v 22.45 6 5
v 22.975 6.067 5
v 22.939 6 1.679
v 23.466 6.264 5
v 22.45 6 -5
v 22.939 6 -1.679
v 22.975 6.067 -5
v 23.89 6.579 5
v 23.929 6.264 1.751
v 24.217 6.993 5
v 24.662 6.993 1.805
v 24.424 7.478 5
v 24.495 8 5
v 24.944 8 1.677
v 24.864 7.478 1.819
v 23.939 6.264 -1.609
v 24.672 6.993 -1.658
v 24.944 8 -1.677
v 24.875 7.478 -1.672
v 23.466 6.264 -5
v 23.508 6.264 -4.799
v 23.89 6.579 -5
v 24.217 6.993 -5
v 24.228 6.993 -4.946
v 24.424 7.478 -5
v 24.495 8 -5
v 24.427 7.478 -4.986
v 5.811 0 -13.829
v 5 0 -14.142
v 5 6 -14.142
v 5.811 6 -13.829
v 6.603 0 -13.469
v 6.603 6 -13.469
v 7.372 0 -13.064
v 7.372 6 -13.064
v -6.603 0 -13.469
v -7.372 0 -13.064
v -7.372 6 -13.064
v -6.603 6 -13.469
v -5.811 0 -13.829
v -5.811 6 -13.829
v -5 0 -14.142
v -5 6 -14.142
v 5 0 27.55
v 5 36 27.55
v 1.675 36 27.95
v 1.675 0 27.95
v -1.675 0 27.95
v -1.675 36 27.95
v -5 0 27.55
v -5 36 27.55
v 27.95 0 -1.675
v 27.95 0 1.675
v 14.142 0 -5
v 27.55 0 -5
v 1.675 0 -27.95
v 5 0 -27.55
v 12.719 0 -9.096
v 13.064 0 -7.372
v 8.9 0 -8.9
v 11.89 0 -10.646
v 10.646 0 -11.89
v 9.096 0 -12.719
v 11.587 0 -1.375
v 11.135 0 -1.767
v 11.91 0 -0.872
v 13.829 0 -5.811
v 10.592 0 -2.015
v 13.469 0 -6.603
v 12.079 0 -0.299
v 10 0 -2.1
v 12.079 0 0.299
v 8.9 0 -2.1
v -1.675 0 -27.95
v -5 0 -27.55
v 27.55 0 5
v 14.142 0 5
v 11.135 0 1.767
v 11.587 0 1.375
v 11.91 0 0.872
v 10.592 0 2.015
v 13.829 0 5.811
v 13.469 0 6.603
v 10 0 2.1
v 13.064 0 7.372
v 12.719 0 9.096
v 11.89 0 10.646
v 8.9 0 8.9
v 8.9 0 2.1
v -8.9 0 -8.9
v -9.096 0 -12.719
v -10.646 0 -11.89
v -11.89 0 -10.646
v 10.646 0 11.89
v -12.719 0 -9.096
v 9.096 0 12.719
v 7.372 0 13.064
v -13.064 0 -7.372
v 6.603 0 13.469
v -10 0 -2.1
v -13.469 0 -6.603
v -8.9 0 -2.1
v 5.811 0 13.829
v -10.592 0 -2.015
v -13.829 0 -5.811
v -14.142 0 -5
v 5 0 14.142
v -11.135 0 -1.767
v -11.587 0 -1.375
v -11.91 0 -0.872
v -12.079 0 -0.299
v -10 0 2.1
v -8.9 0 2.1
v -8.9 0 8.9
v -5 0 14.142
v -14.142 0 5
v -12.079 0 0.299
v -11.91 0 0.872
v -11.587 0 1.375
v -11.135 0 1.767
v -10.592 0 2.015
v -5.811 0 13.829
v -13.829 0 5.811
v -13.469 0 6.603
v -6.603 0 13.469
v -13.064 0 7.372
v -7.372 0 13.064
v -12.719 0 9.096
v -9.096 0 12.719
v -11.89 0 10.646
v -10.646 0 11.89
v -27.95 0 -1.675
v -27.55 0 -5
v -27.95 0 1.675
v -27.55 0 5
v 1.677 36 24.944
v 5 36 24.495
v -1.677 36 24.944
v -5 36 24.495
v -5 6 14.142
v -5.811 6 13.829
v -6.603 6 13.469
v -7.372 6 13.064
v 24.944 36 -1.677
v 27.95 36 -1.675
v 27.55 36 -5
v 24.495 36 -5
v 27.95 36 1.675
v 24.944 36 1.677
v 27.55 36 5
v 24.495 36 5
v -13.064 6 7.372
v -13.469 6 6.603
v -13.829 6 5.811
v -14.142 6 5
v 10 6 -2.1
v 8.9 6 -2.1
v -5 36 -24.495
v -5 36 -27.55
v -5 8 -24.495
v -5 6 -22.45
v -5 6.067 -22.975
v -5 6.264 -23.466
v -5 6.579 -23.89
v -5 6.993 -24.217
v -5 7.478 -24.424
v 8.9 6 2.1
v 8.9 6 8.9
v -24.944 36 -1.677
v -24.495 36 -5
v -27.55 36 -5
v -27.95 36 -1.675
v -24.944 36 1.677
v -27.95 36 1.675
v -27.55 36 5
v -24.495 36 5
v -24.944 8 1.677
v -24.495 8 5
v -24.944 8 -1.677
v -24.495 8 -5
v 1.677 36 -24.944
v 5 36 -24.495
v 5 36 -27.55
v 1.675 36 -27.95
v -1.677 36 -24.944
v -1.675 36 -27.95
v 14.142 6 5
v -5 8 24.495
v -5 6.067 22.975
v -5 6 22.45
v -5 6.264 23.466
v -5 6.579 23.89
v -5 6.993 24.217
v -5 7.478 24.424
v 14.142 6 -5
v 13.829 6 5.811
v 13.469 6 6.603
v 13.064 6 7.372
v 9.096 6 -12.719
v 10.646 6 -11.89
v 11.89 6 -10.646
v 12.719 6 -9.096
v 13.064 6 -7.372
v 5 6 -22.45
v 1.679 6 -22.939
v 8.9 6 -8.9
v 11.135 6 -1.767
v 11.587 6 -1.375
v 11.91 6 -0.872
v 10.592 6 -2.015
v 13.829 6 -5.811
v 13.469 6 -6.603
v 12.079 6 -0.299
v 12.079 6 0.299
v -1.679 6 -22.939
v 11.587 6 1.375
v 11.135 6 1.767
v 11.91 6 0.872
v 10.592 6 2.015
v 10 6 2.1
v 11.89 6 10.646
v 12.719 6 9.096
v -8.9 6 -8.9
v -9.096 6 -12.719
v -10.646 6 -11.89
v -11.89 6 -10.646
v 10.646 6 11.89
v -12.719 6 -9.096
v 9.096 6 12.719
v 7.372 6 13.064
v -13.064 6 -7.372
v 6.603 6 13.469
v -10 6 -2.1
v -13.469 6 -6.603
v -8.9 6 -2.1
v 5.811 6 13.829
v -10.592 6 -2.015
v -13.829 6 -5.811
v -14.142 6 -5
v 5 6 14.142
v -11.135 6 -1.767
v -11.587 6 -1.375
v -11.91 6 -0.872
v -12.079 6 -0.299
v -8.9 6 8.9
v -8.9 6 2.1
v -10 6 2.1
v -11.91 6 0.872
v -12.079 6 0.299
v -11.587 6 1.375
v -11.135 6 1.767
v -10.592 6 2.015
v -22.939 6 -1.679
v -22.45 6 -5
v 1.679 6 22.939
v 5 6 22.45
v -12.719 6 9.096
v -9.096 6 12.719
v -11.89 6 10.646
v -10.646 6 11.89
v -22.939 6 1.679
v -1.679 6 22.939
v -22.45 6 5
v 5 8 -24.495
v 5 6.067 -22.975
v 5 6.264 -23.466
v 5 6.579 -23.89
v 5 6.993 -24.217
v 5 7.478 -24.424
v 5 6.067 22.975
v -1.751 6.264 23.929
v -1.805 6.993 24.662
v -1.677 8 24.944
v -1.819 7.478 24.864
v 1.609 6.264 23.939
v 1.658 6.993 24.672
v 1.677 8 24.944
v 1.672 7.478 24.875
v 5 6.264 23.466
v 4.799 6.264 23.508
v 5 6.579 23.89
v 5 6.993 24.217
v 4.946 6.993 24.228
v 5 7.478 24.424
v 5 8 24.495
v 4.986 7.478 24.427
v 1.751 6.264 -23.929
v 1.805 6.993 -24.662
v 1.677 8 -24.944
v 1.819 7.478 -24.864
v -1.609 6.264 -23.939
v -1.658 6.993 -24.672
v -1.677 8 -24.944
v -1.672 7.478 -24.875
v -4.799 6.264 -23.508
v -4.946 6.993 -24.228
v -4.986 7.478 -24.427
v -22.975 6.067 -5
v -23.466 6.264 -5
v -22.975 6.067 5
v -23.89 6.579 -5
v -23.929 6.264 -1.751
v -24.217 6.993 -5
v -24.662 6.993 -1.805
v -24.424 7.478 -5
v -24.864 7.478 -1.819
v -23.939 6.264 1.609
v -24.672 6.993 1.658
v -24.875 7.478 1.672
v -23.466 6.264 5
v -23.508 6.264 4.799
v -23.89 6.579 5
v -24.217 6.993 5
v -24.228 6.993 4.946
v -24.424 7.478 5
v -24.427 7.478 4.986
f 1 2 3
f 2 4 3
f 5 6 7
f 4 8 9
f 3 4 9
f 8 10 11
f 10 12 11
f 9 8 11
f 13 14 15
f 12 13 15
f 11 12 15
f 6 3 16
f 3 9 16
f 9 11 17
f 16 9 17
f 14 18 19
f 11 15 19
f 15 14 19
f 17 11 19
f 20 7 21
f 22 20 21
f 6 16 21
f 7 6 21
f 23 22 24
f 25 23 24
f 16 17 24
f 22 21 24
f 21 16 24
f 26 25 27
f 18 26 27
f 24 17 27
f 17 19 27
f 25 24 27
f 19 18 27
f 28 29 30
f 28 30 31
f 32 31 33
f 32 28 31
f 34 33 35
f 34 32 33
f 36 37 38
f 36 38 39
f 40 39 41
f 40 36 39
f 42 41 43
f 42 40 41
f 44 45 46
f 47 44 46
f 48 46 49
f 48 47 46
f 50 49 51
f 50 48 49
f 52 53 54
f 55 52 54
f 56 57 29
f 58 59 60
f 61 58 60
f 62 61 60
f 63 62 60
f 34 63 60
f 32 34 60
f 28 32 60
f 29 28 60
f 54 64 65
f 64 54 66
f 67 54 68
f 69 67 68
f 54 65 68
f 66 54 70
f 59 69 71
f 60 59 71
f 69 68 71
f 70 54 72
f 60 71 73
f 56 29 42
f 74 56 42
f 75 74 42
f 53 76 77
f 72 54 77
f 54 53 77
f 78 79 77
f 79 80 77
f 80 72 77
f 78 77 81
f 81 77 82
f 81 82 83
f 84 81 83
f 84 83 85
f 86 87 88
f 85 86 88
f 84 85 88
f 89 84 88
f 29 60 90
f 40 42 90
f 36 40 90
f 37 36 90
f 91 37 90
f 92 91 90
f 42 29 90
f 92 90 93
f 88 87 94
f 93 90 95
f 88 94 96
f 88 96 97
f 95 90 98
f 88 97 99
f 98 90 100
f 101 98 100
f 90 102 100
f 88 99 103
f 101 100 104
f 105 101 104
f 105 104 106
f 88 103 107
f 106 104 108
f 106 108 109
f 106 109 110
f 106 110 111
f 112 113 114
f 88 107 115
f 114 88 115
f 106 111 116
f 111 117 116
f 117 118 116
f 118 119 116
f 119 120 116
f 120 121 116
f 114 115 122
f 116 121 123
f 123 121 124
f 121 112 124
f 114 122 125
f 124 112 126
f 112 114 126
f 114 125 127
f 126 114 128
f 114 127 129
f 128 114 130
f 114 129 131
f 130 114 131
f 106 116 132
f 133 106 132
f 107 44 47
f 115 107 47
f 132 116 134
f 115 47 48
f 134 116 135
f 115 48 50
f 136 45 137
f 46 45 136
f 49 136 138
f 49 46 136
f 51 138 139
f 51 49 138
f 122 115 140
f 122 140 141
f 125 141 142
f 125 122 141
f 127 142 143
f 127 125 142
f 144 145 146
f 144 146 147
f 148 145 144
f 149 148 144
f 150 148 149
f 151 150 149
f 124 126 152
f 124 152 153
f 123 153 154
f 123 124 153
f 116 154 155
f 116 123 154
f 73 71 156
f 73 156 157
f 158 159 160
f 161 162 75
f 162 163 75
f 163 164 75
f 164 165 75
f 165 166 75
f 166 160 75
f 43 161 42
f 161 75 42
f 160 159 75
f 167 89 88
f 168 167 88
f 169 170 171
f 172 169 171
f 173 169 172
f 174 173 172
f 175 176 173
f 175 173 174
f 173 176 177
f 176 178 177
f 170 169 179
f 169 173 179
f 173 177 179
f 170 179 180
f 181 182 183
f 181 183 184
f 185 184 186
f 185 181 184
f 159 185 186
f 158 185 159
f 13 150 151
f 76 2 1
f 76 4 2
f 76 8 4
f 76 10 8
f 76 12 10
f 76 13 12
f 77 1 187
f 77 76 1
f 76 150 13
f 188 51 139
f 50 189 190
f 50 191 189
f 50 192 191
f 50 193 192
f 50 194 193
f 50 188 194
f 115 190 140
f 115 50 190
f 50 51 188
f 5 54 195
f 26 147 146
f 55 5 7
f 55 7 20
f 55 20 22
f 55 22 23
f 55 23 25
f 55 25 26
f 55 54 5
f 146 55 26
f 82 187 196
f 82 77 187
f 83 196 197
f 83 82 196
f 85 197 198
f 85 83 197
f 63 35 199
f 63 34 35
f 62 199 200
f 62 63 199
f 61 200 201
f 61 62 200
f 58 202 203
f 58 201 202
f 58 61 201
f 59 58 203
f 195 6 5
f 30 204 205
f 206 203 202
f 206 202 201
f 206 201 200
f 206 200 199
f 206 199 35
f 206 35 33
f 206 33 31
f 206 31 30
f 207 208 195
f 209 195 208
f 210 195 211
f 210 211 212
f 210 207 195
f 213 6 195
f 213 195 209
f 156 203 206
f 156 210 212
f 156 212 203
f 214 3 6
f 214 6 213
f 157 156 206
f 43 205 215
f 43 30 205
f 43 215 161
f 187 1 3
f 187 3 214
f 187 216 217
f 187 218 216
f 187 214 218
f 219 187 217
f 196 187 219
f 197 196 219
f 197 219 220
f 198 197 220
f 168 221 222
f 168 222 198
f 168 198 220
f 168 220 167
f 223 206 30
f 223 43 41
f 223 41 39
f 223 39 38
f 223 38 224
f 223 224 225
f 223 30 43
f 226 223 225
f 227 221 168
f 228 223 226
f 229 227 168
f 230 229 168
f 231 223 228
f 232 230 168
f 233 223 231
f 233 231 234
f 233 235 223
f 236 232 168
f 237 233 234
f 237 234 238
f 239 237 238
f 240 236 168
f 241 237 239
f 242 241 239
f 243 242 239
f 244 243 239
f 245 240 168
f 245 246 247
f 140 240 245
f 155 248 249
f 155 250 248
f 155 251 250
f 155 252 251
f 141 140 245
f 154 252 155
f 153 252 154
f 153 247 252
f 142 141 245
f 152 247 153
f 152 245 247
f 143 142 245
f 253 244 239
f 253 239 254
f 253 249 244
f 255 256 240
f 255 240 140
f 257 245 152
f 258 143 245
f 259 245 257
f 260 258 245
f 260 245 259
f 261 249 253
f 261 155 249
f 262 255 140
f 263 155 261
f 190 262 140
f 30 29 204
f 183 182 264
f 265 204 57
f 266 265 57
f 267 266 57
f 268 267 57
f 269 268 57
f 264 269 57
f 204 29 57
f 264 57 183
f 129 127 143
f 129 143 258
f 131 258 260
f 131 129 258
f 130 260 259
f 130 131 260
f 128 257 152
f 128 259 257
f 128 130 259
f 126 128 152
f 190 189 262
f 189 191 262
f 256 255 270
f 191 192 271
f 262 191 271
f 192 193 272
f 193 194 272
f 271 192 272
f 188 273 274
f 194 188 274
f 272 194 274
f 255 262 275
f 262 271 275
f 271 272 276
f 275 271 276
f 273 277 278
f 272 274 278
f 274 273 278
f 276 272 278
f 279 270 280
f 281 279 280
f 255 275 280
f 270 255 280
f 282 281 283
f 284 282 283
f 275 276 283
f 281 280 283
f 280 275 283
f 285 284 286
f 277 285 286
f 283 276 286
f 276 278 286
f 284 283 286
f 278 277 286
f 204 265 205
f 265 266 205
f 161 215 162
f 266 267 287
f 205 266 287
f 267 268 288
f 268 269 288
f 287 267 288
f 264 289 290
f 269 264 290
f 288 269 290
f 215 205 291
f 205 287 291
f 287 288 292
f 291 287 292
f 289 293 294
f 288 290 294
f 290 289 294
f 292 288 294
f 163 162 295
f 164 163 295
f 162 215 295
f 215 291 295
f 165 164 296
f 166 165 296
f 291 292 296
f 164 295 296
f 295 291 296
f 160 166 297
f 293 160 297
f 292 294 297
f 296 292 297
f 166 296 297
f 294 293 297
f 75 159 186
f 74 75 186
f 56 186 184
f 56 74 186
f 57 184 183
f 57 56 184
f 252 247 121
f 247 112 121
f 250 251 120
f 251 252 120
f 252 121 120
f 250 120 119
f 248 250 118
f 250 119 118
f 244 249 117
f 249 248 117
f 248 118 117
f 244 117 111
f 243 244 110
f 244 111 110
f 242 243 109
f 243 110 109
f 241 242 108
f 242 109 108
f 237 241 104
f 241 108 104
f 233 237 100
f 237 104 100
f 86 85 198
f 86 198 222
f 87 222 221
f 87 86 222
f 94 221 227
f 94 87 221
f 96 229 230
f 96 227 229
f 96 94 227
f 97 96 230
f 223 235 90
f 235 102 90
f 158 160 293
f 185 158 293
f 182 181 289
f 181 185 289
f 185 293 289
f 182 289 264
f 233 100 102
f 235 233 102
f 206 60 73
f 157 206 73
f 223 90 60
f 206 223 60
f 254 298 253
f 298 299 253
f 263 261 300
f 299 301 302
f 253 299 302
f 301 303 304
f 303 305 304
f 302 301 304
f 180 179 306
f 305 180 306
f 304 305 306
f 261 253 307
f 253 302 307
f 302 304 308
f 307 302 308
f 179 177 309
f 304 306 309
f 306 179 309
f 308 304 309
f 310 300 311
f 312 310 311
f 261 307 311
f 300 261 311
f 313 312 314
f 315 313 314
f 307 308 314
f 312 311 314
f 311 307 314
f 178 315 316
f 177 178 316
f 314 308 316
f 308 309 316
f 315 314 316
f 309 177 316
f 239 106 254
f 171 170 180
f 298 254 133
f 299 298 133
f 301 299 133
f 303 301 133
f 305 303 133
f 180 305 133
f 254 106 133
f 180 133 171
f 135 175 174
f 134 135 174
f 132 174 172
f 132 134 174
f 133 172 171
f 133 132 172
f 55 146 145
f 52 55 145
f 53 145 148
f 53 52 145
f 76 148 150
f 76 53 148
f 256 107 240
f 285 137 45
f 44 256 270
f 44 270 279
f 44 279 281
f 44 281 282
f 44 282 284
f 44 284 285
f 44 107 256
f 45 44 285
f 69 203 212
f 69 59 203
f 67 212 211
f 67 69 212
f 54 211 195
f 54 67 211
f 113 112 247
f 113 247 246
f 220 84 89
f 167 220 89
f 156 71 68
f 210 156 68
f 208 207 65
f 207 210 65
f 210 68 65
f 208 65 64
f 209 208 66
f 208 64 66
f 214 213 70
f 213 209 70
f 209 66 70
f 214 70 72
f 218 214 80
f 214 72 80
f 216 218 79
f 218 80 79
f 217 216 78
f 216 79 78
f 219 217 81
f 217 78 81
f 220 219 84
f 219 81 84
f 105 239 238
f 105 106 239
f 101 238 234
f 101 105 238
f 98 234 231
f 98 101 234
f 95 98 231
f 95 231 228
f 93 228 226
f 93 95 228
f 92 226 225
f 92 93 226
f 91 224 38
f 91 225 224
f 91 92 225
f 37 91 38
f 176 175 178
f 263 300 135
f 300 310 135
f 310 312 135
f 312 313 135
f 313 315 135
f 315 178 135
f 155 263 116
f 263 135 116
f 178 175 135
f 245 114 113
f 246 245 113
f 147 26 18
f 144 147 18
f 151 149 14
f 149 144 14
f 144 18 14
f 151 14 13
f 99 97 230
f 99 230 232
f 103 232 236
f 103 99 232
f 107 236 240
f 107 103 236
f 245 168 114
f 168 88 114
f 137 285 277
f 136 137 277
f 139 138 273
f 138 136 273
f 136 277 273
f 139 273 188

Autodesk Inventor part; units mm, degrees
ref_plane "YZ Plane" through (0, 0, 0) normal (1, 0, 0) x (0, 1, 0)
ref_plane "XZ Plane" through (0, 0, 0) normal (0, 1, 0) x (-1, 0, 0)
ref_plane "XY Plane" through (0, 0, 0) normal (0, 0, 1) x (1, 0, 0)
sketch "Эскиз1" plane through (0, 0, 0) normal (0, 1, 0) x (-1, 0, 0)
  line L0 (8.9, -8.9) -> (-8.9, -8.9)
  line L1 (-8.9, -8.9) -> (-8.9, -2.1)
  line L2 (-8.9, 8.9) -> (8.9, 8.9)
  line L3 (8.9, 8.9) -> (8.9, 2.1)
  line L4 (0, 0) -> (0, -10.3494) construction
  line L5 (0, 0) -> (-17.6402, 0) construction
  circle A0 centre (10, 0) radius 0.9 construction
  circle A1 centre (-10, 0) radius 0.9 construction
  arc A2 (10, -2.1) -> (10, 2.1) centre (10, 0) ccw
  line L6 (10, -2.1) -> (8.9, -2.1)
  line L7 (10, 2.1) -> (8.9, 2.1)
  line L8 (8.9, -2.1) -> (8.9, -8.9)
  line L9 (8.9, 2.1) -> (8.9, -2.1) construction
  circle A3 centre (-10, 0) radius 0.9 construction
  arc A4 (-10, 2.1) -> (-10, -2.1) centre (-10, 0) ccw
  line L10 (-10, -2.1) -> (-8.9, -2.1)
  line L11 (-10, 2.1) -> (-8.9, 2.1)
  line L12 (-8.9, -2.1) -> (-8.9, 2.1) construction
  line L13 (-8.9, 2.1) -> (-8.9, 8.9)
  circle A5 centre (0, 0) radius 15
  arc A6 (-24.4949, -5) -> (-24.4949, 5) centre (0, 0) ccw construction
  line L14 (-14.1421, -5) -> (-27.55, -5)
  line L15 (-27.55, 5) -> (-14.1421, 5)
  arc A7 (-27.55, -5) -> (-27.55, 5) centre (0, 0) ccw construction
  arc A8 (-24.4949, 5) -> (-24.4949, -5) centre (0, 0) ccw
  arc A9 (-27.55, 5) -> (-27.55, -5) centre (0, 0) ccw
  line L16 (14.1421, -5) -> (27.55, -5)
  line L17 (27.55, 5) -> (14.1421, 5)
  arc A10 (24.4949, -5) -> (24.4949, 5) centre (0, 0) ccw
  arc A11 (27.55, -5) -> (27.55, 5) centre (0, 0) ccw
  line L18 (0, 0) -> (-17.6777, -17.6777) construction
  line L19 (0, 0) -> (25, 0) construction
  line L20 (-5, -14.1421) -> (-5, -27.55)
  line L21 (5, -27.55) -> (5, -14.1421)
  arc A12 (-5, -24.4949) -> (5, -24.4949) centre (0, 0) ccw
  arc A13 (-5, -27.55) -> (5, -27.55) centre (0, 0) ccw
  arc A14 (5, 24.4949) -> (-5, 24.4949) centre (0, 0) ccw
  line L22 (-5, 14.1421) -> (-5, 27.55)
  arc A15 (5, 27.55) -> (-5, 27.55) centre (0, 0) ccw
  line L23 (5, 27.55) -> (5, 14.1421)
  arc A16 (-13.0635, -7.3719) -> (-7.3719, -13.0635) centre (-7.0711, -7.0711) ccw
  arc A17 (7.3719, -13.0635) -> (13.0635, -7.3719) centre (7.0711, -7.0711) ccw
  arc A18 (-7.3719, 13.0635) -> (-13.0635, 7.3719) centre (-7.0711, 7.0711) ccw
  arc A19 (13.0635, 7.3719) -> (7.3719, 13.0635) centre (7.0711, 7.0711) ccw
  point P0 (17.6402, 0)
  point P1 (0, -17.6402)
  point P2 (0, 17.6402)
  point P3 (0, 25)
  point P4 (-13.0635, 7.3719)
  point P5 (-7.3719, 13.0635)
  point P6 (13.0635, -7.3719)
  point P7 (7.3719, -13.0635)
  point P8 (7.3719, 13.0635)
  point P9 (13.0635, 7.3719)
  dimension "d0" = 17.8
  dimension "d1" = 17.8
  dimension "d2" = 1.8
  dimension "d3" = 20
  dimension "d4" = 4.2
  dimension "d5" = 30
  dimension "d15" = 50
  dimension "d17" = 10
  dimension "d18" = 3
  dimension "d19" = 135
  dimension "d22" = 12
  dimension "d23" = 10
extrude "Выдавливание1" add sketch "Эскиз1" along normal blind 6 contours A5 | A5 L17 A10 L16 | A5 A19 | A17 A5 | A5 L22 A14 L23 | L21 A12 L20 A5 | A5 A18 | A16 A5 | A5 L14 A8 L15
sketch "Эскиз2" plane through (0, 0, 0) normal (0, 1, 0) x (-1, 0, 0)
  arc A0 (-13.0635, 7.3719) -> (-14.1421, 5) centre (0, 0) ccw construction
  line L0 (8.9, -2.1) -> (8.9, -8.9) construction
  line L1 (8.9, -8.9) -> (-8.9, -8.9) construction
  line L2 (-8.9, -8.9) -> (-8.9, -2.1) construction
  line L3 (-8.9, -2.1) -> (-10, -2.1) construction
  arc A1 (-10, 2.1) -> (-10, -2.1) centre (-10, 0) ccw construction
  line L4 (-10, 2.1) -> (-8.9, 2.1) construction
  line L5 (-8.9, 2.1) -> (-8.9, 8.9) construction
  line L6 (-8.9, 8.9) -> (8.9, 8.9) construction
  line L7 (8.9, 8.9) -> (8.9, 2.1) construction
  line L8 (8.9, 2.1) -> (10, 2.1) construction
  arc A2 (10, -2.1) -> (10, 2.1) centre (10, 0) ccw construction
  line L9 (10, -2.1) -> (8.9, -2.1) construction
  circle A3 centre (14.713, -5.4) radius 1.4
  line L10 (0, 0) -> (0, -15) construction
  circle A4 centre (-14.713, -5.4) radius 1.4
  arc A5 (12.5706, -3.3) -> (16.8554, -3.3) centre (14.713, -5.4) ccw
  arc A6 (-16.8554, -3.3) -> (-12.5706, -3.3) centre (-14.713, -5.4) ccw
  line L11 (14.713, -5.4) -> (14.713, -3.3) construction
  line L12 (16.8554, -3.3) -> (12.5706, -3.3)
  line L13 (-16.8554, -3.3) -> (-12.5706, -3.3)
  arc A7 (-5, 14.1421) -> (-7.3719, 13.0635) centre (0, 0) ccw projected
  line L14 (-5, -14.1421) -> (-5, -24.4949) projected
  arc A8 (-5, -24.4949) -> (5, -24.4949) centre (0, 0) ccw projected
  line L15 (5, -24.4949) -> (5, -14.1421) projected
  line L16 (14.1421, -5) -> (24.4949, -5) projected
  arc A9 (24.4949, -5) -> (24.4949, 5) centre (0, 0) ccw projected
  line L17 (24.4949, 5) -> (14.1421, 5) projected
  arc A10 (7.3719, 13.0635) -> (5, 14.1421) centre (0, 0) ccw projected
  line L18 (5, 14.1421) -> (5, 24.4949) projected
  arc A11 (5, 24.4949) -> (-5, 24.4949) centre (0, 0) ccw projected
  line L19 (-5, 24.4949) -> (-5, 14.1421) projected
  arc A12 (14.1421, 5) -> (13.0635, 7.3719) centre (0, 0) ccw projected
  line L20 (-14.1421, 5) -> (-24.4949, 5) projected
  arc A13 (-24.4949, 5) -> (-24.4949, -5) centre (0, 0) ccw projected
  line L21 (-24.4949, -5) -> (-14.1421, -5) projected
  arc A14 (-14.1421, -5) -> (-13.0635, -7.3719) centre (0, 0) ccw projected
  arc A15 (-13.0635, -7.3719) -> (-7.3719, -13.0635) centre (-7.0711, -7.0711) ccw projected
  arc A16 (-7.3719, -13.0635) -> (-5, -14.1421) centre (0, 0) ccw projected
  arc A17 (5, -14.1421) -> (7.3719, -13.0635) centre (0, 0) ccw projected
  arc A18 (7.3719, -13.0635) -> (13.0635, -7.3719) centre (7.0711, -7.0711) ccw projected
  arc A19 (13.0635, -7.3719) -> (14.1421, -5) centre (0, 0) ccw projected
  arc A20 (13.0635, 7.3719) -> (7.3719, 13.0635) centre (7.0711, 7.0711) ccw projected
  arc A21 (-7.3719, 13.0635) -> (-13.0635, 7.3719) centre (-7.0711, 7.0711) ccw projected
  dimension "d8" = 2.8
  dimension "d9" = 3.3
  dimension "d10" = 29.426
  dimension "d11" = 6
  dimension "d14" = 2.1
extrude "Выдавливание2" [suppressed]
extrude "Выдавливание3" add sketch "Эскиз1" along normal blind 36 contours L17 A11 L16 A10 | A14 L22 A15 L23 | L21 A13 L20 A12 | A8 L14 A9 L15
fillet "Сопряжение1" radius 2 4 edges at (0, 6, -25) (25, 6, 0) (-25, 6, 0) (0, 6, 25)
properties part number "mirror_mount_empty"
